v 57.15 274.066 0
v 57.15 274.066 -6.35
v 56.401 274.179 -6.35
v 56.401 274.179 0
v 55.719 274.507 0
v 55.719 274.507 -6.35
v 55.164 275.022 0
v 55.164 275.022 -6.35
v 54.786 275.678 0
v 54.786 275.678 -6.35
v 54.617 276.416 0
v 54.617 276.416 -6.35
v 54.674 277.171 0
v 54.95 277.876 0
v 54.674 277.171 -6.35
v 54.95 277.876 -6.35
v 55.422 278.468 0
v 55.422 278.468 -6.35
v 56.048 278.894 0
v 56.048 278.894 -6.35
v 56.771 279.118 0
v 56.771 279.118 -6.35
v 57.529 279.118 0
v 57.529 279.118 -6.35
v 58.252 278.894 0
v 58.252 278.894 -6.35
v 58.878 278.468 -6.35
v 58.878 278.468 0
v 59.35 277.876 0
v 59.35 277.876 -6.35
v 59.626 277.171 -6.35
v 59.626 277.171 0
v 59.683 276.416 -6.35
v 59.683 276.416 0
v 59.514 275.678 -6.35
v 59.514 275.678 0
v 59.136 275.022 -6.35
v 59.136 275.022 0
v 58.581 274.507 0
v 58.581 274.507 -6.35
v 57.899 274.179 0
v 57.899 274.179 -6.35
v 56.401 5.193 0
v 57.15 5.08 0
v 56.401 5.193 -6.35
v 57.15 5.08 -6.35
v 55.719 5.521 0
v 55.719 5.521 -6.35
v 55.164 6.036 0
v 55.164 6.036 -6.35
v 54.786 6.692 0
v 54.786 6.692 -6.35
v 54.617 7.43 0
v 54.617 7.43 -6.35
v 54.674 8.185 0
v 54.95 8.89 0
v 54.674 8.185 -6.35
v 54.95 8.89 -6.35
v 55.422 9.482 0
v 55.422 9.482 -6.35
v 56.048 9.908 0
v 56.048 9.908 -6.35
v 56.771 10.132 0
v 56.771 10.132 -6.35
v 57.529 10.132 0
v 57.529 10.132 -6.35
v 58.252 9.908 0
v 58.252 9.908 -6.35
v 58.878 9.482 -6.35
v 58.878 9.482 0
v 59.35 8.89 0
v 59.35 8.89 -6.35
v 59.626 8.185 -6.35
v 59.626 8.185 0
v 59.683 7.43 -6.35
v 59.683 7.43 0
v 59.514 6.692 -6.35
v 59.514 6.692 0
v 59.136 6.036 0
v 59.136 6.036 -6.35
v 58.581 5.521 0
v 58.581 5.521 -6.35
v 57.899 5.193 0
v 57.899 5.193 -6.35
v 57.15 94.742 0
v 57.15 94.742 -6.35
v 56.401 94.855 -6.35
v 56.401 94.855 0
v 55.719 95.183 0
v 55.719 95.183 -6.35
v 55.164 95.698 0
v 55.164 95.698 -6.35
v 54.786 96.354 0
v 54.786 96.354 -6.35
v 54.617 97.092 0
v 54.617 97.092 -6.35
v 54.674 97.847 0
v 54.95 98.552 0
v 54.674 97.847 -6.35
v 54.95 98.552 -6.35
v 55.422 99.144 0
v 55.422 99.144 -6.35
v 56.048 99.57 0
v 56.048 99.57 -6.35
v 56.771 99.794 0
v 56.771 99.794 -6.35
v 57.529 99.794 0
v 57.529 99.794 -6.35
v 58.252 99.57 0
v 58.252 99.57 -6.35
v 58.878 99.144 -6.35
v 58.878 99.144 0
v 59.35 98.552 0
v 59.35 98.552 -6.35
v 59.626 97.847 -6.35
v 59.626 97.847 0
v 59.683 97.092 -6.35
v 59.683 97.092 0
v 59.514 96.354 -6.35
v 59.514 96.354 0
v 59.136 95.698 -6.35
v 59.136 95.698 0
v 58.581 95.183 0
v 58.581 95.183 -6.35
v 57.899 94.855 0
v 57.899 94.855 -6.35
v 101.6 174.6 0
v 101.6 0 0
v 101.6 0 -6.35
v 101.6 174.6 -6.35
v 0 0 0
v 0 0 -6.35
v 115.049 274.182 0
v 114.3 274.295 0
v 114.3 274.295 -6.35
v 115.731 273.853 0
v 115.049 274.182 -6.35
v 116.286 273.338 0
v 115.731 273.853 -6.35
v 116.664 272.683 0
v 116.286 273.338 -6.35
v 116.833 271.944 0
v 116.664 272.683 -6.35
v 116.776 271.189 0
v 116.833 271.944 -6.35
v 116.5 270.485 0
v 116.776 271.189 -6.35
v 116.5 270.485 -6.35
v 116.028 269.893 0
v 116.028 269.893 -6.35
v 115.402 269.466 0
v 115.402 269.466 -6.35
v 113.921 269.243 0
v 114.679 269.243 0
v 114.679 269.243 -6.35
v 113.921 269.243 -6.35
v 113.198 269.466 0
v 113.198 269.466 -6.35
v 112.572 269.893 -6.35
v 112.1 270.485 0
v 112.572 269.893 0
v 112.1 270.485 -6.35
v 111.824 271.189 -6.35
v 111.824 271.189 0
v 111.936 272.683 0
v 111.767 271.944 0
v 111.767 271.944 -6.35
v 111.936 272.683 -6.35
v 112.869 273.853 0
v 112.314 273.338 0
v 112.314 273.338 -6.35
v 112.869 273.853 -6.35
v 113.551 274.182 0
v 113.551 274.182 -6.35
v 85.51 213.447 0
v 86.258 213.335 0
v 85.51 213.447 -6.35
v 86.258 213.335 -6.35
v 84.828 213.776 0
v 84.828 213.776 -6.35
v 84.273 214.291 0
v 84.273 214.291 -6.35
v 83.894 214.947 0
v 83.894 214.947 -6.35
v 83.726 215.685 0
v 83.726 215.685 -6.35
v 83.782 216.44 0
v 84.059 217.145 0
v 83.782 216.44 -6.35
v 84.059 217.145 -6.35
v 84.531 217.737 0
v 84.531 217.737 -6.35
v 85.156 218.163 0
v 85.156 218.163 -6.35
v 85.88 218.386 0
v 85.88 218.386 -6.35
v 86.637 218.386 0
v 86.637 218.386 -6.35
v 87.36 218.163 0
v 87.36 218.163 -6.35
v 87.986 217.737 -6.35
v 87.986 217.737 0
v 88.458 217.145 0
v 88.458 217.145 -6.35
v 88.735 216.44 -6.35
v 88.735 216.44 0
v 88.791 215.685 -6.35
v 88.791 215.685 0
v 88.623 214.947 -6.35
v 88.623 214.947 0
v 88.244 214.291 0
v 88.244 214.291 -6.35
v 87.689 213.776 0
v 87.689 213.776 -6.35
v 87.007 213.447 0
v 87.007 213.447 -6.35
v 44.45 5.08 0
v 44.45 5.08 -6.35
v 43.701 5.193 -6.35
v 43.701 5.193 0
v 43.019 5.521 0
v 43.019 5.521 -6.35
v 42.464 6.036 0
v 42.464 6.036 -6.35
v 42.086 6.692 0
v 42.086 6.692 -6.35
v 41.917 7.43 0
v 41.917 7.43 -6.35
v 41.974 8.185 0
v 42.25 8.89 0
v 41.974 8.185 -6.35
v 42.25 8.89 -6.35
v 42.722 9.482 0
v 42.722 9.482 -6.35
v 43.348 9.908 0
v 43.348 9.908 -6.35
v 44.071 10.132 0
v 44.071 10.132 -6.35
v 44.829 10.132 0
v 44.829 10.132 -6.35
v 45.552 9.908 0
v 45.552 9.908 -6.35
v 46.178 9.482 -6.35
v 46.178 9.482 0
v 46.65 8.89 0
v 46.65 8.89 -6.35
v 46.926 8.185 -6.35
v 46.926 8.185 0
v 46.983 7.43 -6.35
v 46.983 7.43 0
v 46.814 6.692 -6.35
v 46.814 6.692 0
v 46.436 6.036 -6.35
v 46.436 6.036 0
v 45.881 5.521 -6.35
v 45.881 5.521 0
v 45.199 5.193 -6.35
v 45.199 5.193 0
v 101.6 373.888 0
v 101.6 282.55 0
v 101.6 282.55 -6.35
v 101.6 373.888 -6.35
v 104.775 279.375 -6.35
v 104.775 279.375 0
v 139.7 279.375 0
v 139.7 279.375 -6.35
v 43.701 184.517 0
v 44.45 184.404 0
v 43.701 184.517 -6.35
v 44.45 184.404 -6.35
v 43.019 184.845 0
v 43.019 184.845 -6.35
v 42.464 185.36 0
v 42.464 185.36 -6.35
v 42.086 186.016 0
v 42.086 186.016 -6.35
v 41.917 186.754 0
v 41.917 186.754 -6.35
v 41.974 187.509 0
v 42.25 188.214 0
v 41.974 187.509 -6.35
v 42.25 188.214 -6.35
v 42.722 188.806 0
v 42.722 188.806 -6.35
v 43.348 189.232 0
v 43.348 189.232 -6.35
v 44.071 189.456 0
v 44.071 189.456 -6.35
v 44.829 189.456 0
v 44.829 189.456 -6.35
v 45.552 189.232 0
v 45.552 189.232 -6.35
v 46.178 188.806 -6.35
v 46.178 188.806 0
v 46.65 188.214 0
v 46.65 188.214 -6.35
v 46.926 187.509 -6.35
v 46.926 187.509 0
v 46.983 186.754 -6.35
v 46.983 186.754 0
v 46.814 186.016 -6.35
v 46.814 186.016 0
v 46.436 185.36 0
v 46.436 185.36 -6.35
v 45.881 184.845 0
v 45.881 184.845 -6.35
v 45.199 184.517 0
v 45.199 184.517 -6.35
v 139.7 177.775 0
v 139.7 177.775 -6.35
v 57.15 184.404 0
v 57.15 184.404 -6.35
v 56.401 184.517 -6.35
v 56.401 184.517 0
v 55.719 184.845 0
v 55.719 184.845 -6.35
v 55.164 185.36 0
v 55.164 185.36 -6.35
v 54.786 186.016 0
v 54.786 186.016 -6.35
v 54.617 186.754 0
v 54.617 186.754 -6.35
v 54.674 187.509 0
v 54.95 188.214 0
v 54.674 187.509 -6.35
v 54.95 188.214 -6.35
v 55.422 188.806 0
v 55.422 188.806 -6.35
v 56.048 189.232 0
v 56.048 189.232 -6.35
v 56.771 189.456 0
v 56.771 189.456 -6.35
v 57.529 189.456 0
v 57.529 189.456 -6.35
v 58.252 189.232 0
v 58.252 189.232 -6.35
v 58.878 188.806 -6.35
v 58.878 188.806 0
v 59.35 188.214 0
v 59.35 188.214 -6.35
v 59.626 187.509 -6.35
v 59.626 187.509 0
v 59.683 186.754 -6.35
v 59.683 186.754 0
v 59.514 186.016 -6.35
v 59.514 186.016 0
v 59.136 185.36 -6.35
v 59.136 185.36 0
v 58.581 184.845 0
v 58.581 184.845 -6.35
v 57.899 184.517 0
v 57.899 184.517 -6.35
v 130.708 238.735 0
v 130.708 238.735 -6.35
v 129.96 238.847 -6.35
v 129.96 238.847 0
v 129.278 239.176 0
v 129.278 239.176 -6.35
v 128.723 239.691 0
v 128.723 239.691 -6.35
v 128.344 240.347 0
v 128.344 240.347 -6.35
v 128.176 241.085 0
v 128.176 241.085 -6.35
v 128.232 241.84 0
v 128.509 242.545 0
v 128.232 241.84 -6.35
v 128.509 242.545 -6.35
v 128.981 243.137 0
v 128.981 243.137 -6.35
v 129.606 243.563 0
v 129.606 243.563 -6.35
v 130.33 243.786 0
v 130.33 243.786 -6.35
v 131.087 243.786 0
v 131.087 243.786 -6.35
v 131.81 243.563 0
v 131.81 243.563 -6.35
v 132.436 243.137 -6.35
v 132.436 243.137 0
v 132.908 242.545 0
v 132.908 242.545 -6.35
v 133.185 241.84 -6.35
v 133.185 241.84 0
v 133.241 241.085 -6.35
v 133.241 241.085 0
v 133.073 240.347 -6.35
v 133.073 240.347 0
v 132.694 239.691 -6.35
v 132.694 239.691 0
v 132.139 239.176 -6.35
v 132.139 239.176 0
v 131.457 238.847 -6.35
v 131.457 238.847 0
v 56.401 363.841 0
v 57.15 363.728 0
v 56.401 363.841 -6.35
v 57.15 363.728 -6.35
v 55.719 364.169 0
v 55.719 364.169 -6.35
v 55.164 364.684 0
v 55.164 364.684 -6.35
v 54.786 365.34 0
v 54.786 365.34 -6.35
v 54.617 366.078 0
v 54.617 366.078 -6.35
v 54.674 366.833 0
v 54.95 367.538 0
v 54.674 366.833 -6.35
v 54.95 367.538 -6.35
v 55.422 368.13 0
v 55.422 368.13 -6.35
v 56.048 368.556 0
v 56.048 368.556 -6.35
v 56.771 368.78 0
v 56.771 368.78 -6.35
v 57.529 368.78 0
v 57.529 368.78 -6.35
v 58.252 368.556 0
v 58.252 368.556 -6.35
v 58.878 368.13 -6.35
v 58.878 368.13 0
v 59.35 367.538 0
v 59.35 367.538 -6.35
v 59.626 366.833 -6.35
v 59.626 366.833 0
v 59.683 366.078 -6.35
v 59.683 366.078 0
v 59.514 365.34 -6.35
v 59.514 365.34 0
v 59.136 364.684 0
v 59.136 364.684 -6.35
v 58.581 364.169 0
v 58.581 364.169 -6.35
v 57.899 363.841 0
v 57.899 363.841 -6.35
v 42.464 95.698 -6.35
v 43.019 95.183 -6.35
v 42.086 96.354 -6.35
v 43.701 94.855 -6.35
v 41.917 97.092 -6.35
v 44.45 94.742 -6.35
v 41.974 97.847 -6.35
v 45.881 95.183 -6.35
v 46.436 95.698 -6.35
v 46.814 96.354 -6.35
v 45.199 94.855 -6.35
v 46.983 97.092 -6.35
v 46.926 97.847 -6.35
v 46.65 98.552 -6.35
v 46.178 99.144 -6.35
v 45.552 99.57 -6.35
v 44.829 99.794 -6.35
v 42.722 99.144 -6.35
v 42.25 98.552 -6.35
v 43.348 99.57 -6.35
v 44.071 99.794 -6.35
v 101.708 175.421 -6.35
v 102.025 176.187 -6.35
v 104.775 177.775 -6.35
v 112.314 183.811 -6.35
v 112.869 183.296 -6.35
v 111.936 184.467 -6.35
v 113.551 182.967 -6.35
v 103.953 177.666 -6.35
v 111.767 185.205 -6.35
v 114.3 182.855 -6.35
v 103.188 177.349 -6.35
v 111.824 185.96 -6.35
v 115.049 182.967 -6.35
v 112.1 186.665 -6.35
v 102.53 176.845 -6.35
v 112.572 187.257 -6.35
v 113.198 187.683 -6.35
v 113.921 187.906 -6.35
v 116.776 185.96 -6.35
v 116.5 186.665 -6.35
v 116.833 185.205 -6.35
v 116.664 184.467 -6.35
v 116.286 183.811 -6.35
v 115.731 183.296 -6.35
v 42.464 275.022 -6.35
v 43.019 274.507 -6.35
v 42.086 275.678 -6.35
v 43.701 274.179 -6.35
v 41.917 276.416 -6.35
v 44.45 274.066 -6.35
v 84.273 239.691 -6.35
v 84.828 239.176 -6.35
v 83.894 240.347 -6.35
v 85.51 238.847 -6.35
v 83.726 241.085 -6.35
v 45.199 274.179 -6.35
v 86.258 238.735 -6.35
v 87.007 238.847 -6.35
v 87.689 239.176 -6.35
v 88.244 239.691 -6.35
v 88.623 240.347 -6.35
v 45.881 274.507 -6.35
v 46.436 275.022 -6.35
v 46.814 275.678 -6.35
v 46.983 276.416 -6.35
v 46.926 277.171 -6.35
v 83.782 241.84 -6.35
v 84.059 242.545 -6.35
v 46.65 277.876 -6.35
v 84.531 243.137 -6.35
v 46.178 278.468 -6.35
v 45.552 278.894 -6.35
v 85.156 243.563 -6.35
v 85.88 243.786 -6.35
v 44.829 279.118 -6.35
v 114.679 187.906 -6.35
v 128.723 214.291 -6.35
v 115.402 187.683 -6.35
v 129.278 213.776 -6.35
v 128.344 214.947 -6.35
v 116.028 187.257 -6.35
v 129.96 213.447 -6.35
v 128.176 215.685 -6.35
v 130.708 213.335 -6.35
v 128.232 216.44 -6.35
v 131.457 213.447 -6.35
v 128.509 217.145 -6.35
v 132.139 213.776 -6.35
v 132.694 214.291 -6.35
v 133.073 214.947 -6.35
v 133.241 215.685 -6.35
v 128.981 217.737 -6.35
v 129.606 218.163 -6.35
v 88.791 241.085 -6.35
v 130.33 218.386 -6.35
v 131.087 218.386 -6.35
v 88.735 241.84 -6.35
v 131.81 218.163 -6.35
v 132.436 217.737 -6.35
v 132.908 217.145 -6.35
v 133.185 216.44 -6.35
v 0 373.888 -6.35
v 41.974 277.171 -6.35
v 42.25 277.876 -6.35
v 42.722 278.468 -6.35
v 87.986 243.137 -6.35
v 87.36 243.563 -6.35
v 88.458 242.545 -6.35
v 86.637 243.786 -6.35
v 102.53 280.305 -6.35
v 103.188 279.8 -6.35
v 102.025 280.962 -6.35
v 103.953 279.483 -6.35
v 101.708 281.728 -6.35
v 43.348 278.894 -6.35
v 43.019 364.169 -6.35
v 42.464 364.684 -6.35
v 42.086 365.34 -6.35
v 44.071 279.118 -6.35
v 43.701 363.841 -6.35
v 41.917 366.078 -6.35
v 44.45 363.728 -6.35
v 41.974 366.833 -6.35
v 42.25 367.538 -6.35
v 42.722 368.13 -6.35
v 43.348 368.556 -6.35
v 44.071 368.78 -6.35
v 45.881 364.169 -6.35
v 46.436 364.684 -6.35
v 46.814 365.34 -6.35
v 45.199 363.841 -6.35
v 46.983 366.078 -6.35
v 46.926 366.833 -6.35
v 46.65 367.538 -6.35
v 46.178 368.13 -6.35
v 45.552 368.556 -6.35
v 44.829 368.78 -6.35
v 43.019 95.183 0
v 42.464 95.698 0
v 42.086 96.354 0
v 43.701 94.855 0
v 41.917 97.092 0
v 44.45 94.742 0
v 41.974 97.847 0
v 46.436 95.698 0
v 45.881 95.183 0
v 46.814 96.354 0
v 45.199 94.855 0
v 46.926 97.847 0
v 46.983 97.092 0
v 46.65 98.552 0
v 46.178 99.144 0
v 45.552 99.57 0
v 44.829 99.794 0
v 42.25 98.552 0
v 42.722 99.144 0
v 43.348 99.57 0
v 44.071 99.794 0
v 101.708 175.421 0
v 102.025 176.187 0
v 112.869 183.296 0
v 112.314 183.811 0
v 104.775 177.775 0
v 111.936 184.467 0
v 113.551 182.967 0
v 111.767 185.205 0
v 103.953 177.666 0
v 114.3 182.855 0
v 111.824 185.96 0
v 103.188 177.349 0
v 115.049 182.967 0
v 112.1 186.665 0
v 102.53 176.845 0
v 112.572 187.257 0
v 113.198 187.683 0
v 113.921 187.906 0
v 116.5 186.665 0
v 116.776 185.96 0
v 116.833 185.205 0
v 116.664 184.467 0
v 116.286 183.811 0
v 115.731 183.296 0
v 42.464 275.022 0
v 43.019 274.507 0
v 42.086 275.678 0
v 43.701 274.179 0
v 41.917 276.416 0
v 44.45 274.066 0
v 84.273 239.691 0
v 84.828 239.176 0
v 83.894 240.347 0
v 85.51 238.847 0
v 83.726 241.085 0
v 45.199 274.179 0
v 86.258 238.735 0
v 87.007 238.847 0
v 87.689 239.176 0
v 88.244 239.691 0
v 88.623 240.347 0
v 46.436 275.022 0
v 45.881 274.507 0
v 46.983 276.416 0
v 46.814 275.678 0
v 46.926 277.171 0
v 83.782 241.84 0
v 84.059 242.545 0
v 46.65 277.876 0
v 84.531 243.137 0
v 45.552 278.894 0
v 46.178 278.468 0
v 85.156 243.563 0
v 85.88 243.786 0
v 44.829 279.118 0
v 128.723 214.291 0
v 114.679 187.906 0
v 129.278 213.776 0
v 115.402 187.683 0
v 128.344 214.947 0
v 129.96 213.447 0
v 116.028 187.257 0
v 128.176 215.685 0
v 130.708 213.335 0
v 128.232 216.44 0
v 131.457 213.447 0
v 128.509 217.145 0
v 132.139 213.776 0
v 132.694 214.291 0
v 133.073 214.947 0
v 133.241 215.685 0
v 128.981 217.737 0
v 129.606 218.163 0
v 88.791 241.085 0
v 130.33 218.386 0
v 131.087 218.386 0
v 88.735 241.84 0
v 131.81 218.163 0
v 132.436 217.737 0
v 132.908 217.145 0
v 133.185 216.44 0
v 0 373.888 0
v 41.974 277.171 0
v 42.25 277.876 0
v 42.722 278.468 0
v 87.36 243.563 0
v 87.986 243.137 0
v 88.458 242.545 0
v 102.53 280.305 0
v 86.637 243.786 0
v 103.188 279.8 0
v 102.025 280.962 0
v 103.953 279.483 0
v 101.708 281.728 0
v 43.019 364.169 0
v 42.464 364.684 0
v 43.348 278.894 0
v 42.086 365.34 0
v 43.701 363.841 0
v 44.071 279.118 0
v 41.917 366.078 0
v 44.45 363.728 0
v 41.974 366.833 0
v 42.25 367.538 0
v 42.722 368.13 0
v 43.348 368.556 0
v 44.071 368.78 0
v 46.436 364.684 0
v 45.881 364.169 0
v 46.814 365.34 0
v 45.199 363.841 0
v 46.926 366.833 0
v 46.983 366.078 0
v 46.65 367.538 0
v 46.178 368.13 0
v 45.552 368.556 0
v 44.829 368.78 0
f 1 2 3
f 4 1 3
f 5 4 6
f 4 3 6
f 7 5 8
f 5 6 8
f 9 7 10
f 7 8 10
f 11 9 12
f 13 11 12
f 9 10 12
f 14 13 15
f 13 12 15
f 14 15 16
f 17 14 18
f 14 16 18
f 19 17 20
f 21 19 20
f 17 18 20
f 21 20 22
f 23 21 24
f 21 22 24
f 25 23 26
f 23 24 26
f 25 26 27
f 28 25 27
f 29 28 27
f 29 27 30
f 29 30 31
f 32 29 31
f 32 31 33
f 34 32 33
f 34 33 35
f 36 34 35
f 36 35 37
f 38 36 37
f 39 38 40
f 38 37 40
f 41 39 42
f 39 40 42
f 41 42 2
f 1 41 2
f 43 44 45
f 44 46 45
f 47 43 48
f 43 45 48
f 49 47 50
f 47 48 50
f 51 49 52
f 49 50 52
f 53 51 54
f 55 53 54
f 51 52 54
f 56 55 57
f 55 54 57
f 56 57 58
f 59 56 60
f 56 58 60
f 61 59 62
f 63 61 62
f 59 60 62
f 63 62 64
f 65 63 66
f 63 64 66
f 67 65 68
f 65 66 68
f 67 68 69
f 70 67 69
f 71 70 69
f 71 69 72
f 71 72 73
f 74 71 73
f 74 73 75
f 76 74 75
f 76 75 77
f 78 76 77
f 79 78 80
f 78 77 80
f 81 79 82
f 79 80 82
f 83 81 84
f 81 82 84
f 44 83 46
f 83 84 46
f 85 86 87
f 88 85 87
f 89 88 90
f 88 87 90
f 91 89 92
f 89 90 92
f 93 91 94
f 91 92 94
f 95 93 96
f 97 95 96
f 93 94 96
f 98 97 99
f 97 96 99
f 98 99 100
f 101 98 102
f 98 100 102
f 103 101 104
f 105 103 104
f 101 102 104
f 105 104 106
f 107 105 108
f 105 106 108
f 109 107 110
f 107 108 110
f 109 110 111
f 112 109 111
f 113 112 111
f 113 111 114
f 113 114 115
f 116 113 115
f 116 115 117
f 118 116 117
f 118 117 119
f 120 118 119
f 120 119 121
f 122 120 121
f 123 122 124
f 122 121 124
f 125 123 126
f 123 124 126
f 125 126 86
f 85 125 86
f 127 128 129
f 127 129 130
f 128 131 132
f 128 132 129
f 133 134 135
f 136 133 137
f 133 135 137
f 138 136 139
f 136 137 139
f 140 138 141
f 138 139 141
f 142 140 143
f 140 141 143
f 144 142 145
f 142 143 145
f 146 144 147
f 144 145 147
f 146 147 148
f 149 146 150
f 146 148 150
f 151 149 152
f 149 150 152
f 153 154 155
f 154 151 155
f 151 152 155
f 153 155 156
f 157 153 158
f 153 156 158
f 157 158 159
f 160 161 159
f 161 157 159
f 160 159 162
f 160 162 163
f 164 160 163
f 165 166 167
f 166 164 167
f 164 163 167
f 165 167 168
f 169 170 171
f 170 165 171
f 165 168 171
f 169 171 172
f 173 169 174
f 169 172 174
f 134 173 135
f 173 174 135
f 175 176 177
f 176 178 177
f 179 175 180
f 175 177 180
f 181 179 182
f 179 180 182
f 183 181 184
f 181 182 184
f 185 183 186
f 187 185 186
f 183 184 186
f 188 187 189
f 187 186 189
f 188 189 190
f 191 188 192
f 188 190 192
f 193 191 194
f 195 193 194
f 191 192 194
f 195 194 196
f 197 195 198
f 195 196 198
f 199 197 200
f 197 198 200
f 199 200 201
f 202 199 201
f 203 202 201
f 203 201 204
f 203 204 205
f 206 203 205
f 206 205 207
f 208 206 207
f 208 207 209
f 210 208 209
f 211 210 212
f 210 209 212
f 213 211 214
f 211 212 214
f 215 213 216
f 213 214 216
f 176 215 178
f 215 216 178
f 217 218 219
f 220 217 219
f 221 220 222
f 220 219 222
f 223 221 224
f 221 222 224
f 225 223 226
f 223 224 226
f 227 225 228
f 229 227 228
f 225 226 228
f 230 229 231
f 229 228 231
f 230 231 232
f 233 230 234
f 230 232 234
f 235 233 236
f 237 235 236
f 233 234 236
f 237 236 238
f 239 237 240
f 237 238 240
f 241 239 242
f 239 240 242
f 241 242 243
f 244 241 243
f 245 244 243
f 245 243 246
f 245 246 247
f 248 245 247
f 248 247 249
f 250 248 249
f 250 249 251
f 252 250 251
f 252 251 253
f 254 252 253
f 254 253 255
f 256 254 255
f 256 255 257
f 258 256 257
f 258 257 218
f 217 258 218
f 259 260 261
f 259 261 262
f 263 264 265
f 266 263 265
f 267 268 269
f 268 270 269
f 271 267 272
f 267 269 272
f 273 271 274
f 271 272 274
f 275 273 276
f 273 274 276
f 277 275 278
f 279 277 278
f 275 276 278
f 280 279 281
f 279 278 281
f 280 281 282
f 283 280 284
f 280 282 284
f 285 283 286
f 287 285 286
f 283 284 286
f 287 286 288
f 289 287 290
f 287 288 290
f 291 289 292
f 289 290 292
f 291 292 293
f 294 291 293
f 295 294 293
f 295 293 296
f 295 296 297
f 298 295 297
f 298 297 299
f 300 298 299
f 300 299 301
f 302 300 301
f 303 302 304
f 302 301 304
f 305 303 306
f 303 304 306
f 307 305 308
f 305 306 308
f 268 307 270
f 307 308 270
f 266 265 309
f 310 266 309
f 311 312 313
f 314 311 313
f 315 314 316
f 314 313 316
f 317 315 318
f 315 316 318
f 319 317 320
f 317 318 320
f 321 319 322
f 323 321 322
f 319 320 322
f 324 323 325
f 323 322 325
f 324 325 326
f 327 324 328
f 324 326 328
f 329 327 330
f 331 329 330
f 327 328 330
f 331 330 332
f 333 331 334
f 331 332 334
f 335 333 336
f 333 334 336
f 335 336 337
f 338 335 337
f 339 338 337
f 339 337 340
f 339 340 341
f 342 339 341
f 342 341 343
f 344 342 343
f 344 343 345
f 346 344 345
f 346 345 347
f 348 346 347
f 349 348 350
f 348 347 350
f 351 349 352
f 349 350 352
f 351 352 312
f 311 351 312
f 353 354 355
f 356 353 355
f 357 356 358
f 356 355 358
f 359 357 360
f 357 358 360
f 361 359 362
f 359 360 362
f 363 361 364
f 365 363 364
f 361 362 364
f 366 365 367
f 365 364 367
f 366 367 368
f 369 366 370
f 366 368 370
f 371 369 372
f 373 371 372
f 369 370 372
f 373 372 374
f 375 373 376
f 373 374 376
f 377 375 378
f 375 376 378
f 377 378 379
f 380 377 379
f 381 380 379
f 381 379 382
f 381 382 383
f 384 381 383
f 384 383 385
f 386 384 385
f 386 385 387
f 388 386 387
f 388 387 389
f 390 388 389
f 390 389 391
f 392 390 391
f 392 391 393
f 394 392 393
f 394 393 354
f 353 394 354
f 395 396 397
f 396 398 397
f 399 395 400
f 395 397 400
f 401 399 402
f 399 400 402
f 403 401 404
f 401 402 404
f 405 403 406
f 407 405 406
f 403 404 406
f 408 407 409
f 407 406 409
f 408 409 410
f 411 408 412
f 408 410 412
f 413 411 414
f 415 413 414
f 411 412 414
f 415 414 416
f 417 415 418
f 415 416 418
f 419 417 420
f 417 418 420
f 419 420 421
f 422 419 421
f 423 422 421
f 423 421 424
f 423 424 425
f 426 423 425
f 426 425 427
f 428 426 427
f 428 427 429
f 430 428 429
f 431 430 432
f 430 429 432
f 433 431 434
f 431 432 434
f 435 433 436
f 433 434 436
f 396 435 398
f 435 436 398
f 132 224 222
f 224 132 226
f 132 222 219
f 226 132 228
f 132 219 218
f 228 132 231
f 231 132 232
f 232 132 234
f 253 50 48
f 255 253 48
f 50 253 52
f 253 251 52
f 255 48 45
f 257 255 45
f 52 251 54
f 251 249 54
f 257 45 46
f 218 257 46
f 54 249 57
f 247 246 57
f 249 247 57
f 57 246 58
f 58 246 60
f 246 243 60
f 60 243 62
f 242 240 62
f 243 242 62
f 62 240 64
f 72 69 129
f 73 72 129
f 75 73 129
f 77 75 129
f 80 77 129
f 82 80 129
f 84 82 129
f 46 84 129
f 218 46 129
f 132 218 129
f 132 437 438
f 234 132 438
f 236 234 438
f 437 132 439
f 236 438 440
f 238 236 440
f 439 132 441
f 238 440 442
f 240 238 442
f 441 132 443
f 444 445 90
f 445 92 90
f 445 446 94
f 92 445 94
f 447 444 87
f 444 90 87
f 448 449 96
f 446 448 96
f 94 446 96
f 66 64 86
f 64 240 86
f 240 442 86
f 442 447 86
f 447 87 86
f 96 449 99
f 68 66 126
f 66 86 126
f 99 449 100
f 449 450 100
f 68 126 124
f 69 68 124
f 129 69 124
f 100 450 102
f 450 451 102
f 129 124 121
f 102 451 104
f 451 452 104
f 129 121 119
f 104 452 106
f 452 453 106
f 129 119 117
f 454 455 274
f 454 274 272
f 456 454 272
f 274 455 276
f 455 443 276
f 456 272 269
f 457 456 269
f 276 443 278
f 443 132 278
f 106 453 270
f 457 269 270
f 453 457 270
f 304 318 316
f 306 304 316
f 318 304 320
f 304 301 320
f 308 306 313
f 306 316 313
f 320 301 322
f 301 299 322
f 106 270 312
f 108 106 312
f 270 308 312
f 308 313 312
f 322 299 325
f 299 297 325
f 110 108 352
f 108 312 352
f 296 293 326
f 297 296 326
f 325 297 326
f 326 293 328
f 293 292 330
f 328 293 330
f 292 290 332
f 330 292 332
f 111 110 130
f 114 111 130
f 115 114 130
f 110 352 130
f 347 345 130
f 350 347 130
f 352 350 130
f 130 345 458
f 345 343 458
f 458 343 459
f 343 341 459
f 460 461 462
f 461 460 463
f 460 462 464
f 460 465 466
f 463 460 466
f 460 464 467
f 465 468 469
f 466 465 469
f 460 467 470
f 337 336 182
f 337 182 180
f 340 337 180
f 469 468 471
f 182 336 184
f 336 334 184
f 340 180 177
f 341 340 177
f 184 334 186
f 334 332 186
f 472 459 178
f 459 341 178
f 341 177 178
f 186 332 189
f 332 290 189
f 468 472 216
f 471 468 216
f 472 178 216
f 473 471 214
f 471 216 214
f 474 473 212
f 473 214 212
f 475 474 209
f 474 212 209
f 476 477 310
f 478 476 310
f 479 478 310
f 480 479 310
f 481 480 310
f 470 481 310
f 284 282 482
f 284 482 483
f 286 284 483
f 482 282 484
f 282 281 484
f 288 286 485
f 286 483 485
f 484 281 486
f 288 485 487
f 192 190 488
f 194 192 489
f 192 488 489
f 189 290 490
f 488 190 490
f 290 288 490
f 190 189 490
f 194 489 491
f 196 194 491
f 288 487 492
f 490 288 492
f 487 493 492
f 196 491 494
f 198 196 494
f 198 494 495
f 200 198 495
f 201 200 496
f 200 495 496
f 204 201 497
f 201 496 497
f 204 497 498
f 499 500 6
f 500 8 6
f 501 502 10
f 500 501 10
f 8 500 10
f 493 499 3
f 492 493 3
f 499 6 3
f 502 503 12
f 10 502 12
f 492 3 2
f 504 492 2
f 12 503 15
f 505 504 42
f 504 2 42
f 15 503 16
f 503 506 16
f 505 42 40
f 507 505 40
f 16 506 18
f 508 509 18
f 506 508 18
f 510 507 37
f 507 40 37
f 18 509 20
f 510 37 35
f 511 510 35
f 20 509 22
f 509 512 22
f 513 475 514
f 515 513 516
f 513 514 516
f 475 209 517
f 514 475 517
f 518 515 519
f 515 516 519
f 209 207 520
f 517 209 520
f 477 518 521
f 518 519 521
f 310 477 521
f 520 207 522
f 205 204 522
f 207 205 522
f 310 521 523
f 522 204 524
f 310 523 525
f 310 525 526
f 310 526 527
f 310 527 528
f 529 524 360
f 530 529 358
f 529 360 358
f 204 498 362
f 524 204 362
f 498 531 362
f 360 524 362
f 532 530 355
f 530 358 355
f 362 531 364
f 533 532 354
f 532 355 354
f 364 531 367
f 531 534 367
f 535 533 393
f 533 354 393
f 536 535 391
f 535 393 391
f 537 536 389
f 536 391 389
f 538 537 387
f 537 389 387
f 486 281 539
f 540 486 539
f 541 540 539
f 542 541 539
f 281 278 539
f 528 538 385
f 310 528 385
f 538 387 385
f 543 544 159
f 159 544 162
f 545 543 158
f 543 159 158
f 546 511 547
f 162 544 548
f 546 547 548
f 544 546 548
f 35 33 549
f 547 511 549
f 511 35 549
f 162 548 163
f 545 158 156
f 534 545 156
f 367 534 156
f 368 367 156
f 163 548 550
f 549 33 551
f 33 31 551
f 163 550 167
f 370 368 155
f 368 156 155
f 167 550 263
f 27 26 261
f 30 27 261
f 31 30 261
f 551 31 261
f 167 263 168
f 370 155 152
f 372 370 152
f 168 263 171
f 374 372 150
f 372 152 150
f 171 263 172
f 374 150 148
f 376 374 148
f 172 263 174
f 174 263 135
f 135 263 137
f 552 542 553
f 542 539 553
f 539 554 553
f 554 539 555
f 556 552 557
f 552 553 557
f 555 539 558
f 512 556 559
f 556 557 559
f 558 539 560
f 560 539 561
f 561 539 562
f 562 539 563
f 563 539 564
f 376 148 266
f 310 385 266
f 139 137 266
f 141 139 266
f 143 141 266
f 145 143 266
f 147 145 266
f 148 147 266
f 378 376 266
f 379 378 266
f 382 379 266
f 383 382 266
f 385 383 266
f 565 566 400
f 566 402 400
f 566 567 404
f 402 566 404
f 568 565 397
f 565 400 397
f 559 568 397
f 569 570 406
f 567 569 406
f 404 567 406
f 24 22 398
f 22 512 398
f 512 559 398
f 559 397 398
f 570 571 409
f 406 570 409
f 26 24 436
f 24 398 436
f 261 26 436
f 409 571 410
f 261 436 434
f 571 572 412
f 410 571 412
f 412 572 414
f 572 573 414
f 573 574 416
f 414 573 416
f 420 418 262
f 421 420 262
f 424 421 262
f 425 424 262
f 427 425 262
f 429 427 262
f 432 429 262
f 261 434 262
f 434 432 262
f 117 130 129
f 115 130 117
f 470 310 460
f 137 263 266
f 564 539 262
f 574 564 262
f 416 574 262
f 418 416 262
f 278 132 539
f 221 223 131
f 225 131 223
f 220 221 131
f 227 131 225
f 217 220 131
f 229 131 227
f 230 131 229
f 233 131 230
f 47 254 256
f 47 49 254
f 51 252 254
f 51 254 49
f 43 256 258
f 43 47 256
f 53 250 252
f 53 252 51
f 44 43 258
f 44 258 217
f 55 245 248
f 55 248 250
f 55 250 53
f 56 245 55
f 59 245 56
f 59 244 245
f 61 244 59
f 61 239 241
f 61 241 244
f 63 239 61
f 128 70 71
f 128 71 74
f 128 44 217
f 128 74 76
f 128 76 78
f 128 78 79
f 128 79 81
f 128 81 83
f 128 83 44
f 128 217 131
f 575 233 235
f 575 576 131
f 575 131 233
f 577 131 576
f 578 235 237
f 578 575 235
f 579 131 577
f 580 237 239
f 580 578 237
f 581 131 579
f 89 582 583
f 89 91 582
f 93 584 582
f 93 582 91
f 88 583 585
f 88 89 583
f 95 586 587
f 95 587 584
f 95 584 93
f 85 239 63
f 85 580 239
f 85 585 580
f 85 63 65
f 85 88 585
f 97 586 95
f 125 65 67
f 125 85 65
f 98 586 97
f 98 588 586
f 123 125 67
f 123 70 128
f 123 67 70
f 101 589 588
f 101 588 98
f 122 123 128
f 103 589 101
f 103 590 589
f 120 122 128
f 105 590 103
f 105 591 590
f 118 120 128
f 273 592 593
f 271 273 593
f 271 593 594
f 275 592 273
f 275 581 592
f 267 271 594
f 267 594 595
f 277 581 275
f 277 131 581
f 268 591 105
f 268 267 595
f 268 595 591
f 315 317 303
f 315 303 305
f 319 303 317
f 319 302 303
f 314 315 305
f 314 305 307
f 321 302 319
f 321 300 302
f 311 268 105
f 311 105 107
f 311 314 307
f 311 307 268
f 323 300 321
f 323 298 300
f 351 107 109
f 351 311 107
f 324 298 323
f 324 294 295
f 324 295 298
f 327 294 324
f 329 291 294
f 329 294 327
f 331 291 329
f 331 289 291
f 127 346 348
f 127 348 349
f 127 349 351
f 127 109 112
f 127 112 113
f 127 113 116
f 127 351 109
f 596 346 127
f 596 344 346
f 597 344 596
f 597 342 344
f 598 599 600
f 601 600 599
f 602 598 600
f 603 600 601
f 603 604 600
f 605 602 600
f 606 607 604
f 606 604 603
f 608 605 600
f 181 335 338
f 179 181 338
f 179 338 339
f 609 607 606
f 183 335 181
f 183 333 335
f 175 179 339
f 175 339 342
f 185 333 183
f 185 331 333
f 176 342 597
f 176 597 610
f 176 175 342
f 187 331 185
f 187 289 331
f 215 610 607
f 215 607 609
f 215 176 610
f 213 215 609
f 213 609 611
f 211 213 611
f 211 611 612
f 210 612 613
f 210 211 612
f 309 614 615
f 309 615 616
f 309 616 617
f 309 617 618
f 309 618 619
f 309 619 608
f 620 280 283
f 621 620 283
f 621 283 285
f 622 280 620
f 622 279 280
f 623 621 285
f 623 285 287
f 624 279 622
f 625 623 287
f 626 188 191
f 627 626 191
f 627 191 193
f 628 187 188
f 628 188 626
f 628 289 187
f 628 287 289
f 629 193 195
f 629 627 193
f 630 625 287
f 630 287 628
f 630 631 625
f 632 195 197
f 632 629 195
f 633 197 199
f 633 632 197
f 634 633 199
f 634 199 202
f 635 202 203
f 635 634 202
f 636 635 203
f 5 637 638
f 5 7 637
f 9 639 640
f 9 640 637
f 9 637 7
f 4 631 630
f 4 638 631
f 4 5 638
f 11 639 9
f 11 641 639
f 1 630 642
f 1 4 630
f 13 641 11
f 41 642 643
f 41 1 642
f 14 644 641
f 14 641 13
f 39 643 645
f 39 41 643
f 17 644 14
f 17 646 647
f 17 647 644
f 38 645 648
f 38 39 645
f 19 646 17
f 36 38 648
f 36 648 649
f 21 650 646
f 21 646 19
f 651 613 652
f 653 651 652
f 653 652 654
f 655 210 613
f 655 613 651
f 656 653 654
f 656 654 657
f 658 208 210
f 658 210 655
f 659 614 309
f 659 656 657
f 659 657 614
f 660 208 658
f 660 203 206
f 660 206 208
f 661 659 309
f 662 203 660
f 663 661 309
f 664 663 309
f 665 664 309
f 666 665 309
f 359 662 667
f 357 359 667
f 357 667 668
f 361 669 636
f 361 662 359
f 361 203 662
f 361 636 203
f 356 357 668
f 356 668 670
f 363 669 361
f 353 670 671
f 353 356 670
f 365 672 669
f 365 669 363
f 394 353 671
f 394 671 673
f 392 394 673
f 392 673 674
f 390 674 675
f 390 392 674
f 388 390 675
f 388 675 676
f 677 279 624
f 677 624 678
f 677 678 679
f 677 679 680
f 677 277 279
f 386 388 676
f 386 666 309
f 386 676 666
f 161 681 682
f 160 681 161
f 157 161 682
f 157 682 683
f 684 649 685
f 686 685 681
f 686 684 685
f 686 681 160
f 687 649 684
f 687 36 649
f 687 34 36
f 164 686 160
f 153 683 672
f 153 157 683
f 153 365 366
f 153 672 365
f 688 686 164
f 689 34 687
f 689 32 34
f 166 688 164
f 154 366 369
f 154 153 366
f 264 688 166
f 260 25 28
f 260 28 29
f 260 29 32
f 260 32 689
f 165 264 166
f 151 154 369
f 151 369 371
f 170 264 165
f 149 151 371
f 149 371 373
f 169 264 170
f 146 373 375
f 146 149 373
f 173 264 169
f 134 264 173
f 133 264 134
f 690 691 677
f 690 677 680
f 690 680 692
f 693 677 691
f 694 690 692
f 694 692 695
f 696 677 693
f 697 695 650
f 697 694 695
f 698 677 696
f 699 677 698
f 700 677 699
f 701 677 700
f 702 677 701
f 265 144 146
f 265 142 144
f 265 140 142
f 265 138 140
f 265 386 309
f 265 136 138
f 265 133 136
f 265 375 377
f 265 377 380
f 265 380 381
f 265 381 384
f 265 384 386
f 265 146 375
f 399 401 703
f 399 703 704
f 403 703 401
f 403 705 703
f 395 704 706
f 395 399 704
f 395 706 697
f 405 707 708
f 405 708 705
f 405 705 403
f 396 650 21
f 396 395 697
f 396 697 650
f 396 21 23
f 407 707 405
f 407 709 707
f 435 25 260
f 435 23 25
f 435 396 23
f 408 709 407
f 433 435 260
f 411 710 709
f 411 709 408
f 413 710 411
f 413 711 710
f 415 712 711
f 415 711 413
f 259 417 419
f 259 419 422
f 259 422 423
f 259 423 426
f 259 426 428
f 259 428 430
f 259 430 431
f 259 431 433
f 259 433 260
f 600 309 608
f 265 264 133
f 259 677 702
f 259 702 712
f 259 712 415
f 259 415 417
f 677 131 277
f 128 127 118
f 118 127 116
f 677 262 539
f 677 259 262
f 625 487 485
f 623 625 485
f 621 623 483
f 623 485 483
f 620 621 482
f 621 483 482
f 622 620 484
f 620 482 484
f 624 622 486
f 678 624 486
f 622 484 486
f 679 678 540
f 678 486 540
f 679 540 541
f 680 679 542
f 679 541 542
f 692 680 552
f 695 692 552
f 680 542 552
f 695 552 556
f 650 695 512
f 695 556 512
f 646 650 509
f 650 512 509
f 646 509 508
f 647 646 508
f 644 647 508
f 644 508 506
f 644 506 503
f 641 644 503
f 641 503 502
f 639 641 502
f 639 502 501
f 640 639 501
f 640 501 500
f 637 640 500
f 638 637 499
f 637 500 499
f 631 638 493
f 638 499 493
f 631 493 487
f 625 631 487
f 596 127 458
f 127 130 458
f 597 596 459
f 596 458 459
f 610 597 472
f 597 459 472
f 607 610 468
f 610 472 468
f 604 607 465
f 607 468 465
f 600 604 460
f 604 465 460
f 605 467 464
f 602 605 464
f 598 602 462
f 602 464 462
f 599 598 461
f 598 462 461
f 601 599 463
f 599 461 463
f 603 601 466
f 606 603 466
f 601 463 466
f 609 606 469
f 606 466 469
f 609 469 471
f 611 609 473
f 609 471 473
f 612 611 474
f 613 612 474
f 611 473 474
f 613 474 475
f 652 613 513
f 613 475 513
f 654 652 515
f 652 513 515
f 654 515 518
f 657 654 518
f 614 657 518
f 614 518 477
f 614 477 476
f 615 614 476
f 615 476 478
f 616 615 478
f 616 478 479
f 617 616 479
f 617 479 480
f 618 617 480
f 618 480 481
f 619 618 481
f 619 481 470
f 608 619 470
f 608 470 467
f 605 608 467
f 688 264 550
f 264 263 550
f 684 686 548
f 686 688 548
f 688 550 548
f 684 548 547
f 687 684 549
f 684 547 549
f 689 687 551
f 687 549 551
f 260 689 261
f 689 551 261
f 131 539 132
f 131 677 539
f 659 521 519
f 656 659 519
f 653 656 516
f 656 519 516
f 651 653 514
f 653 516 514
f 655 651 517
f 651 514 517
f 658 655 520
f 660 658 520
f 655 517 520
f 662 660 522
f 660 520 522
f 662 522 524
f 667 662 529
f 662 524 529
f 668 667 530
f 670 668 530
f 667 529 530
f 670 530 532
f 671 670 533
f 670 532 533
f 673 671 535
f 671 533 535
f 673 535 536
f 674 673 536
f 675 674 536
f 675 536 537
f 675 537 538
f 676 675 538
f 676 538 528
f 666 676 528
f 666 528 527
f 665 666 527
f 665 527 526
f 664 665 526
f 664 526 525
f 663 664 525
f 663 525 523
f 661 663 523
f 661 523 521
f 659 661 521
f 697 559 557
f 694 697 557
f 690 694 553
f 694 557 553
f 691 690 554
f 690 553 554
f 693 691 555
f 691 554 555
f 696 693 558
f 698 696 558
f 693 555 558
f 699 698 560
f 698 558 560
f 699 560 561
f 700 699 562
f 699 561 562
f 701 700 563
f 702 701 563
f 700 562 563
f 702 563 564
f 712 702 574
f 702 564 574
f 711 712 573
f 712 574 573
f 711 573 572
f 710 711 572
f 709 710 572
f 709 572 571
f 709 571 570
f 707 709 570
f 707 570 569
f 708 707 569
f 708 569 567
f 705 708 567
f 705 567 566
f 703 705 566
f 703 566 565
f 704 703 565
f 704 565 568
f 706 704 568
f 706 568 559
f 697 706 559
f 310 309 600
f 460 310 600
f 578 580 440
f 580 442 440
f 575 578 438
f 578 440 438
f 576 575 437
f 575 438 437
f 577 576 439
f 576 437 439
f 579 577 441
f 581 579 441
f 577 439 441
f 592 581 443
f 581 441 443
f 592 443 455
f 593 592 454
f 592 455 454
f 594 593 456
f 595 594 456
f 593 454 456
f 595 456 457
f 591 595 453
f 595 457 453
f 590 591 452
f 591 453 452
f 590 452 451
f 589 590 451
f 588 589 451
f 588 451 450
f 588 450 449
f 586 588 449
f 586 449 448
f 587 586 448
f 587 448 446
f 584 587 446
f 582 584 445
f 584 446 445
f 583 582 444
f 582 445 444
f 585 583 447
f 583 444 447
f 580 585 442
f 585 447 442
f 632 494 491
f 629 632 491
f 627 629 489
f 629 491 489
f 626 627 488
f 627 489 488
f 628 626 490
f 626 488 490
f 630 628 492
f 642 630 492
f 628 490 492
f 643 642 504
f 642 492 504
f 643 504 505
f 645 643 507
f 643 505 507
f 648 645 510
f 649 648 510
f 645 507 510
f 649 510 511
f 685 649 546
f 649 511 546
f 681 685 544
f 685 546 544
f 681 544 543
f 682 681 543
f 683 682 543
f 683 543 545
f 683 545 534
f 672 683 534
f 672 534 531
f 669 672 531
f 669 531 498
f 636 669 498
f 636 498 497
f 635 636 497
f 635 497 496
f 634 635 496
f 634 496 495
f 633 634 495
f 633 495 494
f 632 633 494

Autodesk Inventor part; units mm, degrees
ref_plane "YZ Plane" through (0, 0, 0) normal (1, 0, 0) x (0, 1, 0)
ref_plane "XZ Plane" through (0, 0, 0) normal (0, 1, 0) x (-1, 0, 0)
ref_plane "XY Plane" through (0, 0, 0) normal (0, 0, 1) x (1, 0, 0)
sketch "Sketch1" plane through (0, 0, 0) normal (0, 0, 1) x (1, 0, 0)
  line L0 (0, 0) -> (101.6, 0)
  line L1 (101.6, 0) -> (101.6, 373.888)
  line L2 (101.6, 373.888) -> (0, 373.888)
  line L3 (0, 373.888) -> (0, 0)
  dimension "d0" = 101.6
  dimension "d1" = 373.888
extrude "Extrusion1" add sketch "Sketch1" against normal blind 6.35
sketch "Sketch2" plane through (0, 0, 0) normal (0, 0, 1) x (1, 0, 0)
  line L0 (101.6, 0) -> (101.6, 373.888) projected
  line L1 (50.3784, 186.944) -> (-65.1556, 186.944) construction
  line L2 (0, 228.5746) -> (-60.1541, 228.5746) construction
  line L3 (101.6, 279.3746) -> (139.7, 279.3746)
  line L4 (139.7, 279.3746) -> (139.7, 177.7746)
  line L5 (139.7, 177.7746) -> (101.6, 177.7746)
  line L6 (101.6, 177.7746) -> (101.6, 279.3746)
  line L7 (0, 0) -> (101.6, 0) construction
  line L8 (101.6, 373.888) -> (0, 373.888) construction
  point P0 (101.6, 228.5746)
  dimension "d50" = 41.6306
  dimension "d51" = 38.1
  dimension "d52" = 101.6
  dimension "d53" = 373.888
  dimension "d54" = 186.944
extrude "Extrusion2" add sketch "Sketch2" against normal blind 6.35
fillet "Fillet1" radius 3.175 1 edges at (101.6, 279.3746, -3.175)
fillet "Fillet2" radius 3.175 1 edges at (101.6, 177.7746, -3.175)
sketch "Sketch3" plane through (0, 0, 0) normal (0, 0, 1) x (1, 0, 0)
  line L0 (101.6, 0) -> (101.6, 174.5996) projected
  line L1 (0, 0) -> (101.6, 0) projected
  point P0 (44.45, 7.62)
  point P1 (101.6, 132.969)
  point P2 (101.6, 180.594)
  dimension "d11" = 57.15
  dimension "d12" = 7.62
hole "Hole1" at (44.45, 7.62, 0) direction (0, 0, -1) diameter 5.08 end through all
ref_plane "Work Plane1" through (50.8, 0, 0) normal (-1, 0, 0) x (0, 0, 1)
pattern_linear "Rectangular Pattern1" count 2 spacing 12.7 along (1, 0, 0) count 5 spacing 89.662 along (0, 1, 0) of "Hole1"
ref_plane "Work Plane4" through (139.7, 228.5746, -6.35) normal (0, -1, 0) x (1, 0, 0)
sketch "Sketch6" plane through (0, 0, 0) normal (0, 0, 1) x (1, 0, 0)
  line L0 (139.7, 279.3746) -> (139.7, 177.7746) construction
  line L1 (139.7, 177.7746) -> (104.775, 177.7746) construction
  point P0 (0, 0)
  point P1 (114.3, 185.3946)
  dimension "d56" = 25.4
  dimension "d57" = 7.62
hole "Hole4" at (114.3, 185.3946, 0) direction (0, 0, -1) diameter 5.08 end through all
mirror "Mirror3" about plane through (139.7, 228.5746, -6.35) normal (0, -1, 0) of "Hole4"
sketch "Sketch7" plane through (0, 0, 0) normal (0, 0, 1) x (1, 0, 0)
  line L0 (0, 373.888) -> (0, 0) construction
  line L1 (167.64, 228.5746) -> (-27.94, 228.5746) projected
  point P0 (86.2584, 241.2746)
  dimension "d65" = 86.2584
  dimension "d73" = 12.7
hole "Hole5" at (86.2584, 241.2746, 0) direction (0, 0, -1) diameter 5.08 end through all
pattern_linear "Rectangular Pattern3" count 2 spacing 25.4 along (0, -1, 0) count 2 spacing 44.45 along (1, 0, 0) of "Hole5"
properties part number "Backhoe to Frame Mount"
